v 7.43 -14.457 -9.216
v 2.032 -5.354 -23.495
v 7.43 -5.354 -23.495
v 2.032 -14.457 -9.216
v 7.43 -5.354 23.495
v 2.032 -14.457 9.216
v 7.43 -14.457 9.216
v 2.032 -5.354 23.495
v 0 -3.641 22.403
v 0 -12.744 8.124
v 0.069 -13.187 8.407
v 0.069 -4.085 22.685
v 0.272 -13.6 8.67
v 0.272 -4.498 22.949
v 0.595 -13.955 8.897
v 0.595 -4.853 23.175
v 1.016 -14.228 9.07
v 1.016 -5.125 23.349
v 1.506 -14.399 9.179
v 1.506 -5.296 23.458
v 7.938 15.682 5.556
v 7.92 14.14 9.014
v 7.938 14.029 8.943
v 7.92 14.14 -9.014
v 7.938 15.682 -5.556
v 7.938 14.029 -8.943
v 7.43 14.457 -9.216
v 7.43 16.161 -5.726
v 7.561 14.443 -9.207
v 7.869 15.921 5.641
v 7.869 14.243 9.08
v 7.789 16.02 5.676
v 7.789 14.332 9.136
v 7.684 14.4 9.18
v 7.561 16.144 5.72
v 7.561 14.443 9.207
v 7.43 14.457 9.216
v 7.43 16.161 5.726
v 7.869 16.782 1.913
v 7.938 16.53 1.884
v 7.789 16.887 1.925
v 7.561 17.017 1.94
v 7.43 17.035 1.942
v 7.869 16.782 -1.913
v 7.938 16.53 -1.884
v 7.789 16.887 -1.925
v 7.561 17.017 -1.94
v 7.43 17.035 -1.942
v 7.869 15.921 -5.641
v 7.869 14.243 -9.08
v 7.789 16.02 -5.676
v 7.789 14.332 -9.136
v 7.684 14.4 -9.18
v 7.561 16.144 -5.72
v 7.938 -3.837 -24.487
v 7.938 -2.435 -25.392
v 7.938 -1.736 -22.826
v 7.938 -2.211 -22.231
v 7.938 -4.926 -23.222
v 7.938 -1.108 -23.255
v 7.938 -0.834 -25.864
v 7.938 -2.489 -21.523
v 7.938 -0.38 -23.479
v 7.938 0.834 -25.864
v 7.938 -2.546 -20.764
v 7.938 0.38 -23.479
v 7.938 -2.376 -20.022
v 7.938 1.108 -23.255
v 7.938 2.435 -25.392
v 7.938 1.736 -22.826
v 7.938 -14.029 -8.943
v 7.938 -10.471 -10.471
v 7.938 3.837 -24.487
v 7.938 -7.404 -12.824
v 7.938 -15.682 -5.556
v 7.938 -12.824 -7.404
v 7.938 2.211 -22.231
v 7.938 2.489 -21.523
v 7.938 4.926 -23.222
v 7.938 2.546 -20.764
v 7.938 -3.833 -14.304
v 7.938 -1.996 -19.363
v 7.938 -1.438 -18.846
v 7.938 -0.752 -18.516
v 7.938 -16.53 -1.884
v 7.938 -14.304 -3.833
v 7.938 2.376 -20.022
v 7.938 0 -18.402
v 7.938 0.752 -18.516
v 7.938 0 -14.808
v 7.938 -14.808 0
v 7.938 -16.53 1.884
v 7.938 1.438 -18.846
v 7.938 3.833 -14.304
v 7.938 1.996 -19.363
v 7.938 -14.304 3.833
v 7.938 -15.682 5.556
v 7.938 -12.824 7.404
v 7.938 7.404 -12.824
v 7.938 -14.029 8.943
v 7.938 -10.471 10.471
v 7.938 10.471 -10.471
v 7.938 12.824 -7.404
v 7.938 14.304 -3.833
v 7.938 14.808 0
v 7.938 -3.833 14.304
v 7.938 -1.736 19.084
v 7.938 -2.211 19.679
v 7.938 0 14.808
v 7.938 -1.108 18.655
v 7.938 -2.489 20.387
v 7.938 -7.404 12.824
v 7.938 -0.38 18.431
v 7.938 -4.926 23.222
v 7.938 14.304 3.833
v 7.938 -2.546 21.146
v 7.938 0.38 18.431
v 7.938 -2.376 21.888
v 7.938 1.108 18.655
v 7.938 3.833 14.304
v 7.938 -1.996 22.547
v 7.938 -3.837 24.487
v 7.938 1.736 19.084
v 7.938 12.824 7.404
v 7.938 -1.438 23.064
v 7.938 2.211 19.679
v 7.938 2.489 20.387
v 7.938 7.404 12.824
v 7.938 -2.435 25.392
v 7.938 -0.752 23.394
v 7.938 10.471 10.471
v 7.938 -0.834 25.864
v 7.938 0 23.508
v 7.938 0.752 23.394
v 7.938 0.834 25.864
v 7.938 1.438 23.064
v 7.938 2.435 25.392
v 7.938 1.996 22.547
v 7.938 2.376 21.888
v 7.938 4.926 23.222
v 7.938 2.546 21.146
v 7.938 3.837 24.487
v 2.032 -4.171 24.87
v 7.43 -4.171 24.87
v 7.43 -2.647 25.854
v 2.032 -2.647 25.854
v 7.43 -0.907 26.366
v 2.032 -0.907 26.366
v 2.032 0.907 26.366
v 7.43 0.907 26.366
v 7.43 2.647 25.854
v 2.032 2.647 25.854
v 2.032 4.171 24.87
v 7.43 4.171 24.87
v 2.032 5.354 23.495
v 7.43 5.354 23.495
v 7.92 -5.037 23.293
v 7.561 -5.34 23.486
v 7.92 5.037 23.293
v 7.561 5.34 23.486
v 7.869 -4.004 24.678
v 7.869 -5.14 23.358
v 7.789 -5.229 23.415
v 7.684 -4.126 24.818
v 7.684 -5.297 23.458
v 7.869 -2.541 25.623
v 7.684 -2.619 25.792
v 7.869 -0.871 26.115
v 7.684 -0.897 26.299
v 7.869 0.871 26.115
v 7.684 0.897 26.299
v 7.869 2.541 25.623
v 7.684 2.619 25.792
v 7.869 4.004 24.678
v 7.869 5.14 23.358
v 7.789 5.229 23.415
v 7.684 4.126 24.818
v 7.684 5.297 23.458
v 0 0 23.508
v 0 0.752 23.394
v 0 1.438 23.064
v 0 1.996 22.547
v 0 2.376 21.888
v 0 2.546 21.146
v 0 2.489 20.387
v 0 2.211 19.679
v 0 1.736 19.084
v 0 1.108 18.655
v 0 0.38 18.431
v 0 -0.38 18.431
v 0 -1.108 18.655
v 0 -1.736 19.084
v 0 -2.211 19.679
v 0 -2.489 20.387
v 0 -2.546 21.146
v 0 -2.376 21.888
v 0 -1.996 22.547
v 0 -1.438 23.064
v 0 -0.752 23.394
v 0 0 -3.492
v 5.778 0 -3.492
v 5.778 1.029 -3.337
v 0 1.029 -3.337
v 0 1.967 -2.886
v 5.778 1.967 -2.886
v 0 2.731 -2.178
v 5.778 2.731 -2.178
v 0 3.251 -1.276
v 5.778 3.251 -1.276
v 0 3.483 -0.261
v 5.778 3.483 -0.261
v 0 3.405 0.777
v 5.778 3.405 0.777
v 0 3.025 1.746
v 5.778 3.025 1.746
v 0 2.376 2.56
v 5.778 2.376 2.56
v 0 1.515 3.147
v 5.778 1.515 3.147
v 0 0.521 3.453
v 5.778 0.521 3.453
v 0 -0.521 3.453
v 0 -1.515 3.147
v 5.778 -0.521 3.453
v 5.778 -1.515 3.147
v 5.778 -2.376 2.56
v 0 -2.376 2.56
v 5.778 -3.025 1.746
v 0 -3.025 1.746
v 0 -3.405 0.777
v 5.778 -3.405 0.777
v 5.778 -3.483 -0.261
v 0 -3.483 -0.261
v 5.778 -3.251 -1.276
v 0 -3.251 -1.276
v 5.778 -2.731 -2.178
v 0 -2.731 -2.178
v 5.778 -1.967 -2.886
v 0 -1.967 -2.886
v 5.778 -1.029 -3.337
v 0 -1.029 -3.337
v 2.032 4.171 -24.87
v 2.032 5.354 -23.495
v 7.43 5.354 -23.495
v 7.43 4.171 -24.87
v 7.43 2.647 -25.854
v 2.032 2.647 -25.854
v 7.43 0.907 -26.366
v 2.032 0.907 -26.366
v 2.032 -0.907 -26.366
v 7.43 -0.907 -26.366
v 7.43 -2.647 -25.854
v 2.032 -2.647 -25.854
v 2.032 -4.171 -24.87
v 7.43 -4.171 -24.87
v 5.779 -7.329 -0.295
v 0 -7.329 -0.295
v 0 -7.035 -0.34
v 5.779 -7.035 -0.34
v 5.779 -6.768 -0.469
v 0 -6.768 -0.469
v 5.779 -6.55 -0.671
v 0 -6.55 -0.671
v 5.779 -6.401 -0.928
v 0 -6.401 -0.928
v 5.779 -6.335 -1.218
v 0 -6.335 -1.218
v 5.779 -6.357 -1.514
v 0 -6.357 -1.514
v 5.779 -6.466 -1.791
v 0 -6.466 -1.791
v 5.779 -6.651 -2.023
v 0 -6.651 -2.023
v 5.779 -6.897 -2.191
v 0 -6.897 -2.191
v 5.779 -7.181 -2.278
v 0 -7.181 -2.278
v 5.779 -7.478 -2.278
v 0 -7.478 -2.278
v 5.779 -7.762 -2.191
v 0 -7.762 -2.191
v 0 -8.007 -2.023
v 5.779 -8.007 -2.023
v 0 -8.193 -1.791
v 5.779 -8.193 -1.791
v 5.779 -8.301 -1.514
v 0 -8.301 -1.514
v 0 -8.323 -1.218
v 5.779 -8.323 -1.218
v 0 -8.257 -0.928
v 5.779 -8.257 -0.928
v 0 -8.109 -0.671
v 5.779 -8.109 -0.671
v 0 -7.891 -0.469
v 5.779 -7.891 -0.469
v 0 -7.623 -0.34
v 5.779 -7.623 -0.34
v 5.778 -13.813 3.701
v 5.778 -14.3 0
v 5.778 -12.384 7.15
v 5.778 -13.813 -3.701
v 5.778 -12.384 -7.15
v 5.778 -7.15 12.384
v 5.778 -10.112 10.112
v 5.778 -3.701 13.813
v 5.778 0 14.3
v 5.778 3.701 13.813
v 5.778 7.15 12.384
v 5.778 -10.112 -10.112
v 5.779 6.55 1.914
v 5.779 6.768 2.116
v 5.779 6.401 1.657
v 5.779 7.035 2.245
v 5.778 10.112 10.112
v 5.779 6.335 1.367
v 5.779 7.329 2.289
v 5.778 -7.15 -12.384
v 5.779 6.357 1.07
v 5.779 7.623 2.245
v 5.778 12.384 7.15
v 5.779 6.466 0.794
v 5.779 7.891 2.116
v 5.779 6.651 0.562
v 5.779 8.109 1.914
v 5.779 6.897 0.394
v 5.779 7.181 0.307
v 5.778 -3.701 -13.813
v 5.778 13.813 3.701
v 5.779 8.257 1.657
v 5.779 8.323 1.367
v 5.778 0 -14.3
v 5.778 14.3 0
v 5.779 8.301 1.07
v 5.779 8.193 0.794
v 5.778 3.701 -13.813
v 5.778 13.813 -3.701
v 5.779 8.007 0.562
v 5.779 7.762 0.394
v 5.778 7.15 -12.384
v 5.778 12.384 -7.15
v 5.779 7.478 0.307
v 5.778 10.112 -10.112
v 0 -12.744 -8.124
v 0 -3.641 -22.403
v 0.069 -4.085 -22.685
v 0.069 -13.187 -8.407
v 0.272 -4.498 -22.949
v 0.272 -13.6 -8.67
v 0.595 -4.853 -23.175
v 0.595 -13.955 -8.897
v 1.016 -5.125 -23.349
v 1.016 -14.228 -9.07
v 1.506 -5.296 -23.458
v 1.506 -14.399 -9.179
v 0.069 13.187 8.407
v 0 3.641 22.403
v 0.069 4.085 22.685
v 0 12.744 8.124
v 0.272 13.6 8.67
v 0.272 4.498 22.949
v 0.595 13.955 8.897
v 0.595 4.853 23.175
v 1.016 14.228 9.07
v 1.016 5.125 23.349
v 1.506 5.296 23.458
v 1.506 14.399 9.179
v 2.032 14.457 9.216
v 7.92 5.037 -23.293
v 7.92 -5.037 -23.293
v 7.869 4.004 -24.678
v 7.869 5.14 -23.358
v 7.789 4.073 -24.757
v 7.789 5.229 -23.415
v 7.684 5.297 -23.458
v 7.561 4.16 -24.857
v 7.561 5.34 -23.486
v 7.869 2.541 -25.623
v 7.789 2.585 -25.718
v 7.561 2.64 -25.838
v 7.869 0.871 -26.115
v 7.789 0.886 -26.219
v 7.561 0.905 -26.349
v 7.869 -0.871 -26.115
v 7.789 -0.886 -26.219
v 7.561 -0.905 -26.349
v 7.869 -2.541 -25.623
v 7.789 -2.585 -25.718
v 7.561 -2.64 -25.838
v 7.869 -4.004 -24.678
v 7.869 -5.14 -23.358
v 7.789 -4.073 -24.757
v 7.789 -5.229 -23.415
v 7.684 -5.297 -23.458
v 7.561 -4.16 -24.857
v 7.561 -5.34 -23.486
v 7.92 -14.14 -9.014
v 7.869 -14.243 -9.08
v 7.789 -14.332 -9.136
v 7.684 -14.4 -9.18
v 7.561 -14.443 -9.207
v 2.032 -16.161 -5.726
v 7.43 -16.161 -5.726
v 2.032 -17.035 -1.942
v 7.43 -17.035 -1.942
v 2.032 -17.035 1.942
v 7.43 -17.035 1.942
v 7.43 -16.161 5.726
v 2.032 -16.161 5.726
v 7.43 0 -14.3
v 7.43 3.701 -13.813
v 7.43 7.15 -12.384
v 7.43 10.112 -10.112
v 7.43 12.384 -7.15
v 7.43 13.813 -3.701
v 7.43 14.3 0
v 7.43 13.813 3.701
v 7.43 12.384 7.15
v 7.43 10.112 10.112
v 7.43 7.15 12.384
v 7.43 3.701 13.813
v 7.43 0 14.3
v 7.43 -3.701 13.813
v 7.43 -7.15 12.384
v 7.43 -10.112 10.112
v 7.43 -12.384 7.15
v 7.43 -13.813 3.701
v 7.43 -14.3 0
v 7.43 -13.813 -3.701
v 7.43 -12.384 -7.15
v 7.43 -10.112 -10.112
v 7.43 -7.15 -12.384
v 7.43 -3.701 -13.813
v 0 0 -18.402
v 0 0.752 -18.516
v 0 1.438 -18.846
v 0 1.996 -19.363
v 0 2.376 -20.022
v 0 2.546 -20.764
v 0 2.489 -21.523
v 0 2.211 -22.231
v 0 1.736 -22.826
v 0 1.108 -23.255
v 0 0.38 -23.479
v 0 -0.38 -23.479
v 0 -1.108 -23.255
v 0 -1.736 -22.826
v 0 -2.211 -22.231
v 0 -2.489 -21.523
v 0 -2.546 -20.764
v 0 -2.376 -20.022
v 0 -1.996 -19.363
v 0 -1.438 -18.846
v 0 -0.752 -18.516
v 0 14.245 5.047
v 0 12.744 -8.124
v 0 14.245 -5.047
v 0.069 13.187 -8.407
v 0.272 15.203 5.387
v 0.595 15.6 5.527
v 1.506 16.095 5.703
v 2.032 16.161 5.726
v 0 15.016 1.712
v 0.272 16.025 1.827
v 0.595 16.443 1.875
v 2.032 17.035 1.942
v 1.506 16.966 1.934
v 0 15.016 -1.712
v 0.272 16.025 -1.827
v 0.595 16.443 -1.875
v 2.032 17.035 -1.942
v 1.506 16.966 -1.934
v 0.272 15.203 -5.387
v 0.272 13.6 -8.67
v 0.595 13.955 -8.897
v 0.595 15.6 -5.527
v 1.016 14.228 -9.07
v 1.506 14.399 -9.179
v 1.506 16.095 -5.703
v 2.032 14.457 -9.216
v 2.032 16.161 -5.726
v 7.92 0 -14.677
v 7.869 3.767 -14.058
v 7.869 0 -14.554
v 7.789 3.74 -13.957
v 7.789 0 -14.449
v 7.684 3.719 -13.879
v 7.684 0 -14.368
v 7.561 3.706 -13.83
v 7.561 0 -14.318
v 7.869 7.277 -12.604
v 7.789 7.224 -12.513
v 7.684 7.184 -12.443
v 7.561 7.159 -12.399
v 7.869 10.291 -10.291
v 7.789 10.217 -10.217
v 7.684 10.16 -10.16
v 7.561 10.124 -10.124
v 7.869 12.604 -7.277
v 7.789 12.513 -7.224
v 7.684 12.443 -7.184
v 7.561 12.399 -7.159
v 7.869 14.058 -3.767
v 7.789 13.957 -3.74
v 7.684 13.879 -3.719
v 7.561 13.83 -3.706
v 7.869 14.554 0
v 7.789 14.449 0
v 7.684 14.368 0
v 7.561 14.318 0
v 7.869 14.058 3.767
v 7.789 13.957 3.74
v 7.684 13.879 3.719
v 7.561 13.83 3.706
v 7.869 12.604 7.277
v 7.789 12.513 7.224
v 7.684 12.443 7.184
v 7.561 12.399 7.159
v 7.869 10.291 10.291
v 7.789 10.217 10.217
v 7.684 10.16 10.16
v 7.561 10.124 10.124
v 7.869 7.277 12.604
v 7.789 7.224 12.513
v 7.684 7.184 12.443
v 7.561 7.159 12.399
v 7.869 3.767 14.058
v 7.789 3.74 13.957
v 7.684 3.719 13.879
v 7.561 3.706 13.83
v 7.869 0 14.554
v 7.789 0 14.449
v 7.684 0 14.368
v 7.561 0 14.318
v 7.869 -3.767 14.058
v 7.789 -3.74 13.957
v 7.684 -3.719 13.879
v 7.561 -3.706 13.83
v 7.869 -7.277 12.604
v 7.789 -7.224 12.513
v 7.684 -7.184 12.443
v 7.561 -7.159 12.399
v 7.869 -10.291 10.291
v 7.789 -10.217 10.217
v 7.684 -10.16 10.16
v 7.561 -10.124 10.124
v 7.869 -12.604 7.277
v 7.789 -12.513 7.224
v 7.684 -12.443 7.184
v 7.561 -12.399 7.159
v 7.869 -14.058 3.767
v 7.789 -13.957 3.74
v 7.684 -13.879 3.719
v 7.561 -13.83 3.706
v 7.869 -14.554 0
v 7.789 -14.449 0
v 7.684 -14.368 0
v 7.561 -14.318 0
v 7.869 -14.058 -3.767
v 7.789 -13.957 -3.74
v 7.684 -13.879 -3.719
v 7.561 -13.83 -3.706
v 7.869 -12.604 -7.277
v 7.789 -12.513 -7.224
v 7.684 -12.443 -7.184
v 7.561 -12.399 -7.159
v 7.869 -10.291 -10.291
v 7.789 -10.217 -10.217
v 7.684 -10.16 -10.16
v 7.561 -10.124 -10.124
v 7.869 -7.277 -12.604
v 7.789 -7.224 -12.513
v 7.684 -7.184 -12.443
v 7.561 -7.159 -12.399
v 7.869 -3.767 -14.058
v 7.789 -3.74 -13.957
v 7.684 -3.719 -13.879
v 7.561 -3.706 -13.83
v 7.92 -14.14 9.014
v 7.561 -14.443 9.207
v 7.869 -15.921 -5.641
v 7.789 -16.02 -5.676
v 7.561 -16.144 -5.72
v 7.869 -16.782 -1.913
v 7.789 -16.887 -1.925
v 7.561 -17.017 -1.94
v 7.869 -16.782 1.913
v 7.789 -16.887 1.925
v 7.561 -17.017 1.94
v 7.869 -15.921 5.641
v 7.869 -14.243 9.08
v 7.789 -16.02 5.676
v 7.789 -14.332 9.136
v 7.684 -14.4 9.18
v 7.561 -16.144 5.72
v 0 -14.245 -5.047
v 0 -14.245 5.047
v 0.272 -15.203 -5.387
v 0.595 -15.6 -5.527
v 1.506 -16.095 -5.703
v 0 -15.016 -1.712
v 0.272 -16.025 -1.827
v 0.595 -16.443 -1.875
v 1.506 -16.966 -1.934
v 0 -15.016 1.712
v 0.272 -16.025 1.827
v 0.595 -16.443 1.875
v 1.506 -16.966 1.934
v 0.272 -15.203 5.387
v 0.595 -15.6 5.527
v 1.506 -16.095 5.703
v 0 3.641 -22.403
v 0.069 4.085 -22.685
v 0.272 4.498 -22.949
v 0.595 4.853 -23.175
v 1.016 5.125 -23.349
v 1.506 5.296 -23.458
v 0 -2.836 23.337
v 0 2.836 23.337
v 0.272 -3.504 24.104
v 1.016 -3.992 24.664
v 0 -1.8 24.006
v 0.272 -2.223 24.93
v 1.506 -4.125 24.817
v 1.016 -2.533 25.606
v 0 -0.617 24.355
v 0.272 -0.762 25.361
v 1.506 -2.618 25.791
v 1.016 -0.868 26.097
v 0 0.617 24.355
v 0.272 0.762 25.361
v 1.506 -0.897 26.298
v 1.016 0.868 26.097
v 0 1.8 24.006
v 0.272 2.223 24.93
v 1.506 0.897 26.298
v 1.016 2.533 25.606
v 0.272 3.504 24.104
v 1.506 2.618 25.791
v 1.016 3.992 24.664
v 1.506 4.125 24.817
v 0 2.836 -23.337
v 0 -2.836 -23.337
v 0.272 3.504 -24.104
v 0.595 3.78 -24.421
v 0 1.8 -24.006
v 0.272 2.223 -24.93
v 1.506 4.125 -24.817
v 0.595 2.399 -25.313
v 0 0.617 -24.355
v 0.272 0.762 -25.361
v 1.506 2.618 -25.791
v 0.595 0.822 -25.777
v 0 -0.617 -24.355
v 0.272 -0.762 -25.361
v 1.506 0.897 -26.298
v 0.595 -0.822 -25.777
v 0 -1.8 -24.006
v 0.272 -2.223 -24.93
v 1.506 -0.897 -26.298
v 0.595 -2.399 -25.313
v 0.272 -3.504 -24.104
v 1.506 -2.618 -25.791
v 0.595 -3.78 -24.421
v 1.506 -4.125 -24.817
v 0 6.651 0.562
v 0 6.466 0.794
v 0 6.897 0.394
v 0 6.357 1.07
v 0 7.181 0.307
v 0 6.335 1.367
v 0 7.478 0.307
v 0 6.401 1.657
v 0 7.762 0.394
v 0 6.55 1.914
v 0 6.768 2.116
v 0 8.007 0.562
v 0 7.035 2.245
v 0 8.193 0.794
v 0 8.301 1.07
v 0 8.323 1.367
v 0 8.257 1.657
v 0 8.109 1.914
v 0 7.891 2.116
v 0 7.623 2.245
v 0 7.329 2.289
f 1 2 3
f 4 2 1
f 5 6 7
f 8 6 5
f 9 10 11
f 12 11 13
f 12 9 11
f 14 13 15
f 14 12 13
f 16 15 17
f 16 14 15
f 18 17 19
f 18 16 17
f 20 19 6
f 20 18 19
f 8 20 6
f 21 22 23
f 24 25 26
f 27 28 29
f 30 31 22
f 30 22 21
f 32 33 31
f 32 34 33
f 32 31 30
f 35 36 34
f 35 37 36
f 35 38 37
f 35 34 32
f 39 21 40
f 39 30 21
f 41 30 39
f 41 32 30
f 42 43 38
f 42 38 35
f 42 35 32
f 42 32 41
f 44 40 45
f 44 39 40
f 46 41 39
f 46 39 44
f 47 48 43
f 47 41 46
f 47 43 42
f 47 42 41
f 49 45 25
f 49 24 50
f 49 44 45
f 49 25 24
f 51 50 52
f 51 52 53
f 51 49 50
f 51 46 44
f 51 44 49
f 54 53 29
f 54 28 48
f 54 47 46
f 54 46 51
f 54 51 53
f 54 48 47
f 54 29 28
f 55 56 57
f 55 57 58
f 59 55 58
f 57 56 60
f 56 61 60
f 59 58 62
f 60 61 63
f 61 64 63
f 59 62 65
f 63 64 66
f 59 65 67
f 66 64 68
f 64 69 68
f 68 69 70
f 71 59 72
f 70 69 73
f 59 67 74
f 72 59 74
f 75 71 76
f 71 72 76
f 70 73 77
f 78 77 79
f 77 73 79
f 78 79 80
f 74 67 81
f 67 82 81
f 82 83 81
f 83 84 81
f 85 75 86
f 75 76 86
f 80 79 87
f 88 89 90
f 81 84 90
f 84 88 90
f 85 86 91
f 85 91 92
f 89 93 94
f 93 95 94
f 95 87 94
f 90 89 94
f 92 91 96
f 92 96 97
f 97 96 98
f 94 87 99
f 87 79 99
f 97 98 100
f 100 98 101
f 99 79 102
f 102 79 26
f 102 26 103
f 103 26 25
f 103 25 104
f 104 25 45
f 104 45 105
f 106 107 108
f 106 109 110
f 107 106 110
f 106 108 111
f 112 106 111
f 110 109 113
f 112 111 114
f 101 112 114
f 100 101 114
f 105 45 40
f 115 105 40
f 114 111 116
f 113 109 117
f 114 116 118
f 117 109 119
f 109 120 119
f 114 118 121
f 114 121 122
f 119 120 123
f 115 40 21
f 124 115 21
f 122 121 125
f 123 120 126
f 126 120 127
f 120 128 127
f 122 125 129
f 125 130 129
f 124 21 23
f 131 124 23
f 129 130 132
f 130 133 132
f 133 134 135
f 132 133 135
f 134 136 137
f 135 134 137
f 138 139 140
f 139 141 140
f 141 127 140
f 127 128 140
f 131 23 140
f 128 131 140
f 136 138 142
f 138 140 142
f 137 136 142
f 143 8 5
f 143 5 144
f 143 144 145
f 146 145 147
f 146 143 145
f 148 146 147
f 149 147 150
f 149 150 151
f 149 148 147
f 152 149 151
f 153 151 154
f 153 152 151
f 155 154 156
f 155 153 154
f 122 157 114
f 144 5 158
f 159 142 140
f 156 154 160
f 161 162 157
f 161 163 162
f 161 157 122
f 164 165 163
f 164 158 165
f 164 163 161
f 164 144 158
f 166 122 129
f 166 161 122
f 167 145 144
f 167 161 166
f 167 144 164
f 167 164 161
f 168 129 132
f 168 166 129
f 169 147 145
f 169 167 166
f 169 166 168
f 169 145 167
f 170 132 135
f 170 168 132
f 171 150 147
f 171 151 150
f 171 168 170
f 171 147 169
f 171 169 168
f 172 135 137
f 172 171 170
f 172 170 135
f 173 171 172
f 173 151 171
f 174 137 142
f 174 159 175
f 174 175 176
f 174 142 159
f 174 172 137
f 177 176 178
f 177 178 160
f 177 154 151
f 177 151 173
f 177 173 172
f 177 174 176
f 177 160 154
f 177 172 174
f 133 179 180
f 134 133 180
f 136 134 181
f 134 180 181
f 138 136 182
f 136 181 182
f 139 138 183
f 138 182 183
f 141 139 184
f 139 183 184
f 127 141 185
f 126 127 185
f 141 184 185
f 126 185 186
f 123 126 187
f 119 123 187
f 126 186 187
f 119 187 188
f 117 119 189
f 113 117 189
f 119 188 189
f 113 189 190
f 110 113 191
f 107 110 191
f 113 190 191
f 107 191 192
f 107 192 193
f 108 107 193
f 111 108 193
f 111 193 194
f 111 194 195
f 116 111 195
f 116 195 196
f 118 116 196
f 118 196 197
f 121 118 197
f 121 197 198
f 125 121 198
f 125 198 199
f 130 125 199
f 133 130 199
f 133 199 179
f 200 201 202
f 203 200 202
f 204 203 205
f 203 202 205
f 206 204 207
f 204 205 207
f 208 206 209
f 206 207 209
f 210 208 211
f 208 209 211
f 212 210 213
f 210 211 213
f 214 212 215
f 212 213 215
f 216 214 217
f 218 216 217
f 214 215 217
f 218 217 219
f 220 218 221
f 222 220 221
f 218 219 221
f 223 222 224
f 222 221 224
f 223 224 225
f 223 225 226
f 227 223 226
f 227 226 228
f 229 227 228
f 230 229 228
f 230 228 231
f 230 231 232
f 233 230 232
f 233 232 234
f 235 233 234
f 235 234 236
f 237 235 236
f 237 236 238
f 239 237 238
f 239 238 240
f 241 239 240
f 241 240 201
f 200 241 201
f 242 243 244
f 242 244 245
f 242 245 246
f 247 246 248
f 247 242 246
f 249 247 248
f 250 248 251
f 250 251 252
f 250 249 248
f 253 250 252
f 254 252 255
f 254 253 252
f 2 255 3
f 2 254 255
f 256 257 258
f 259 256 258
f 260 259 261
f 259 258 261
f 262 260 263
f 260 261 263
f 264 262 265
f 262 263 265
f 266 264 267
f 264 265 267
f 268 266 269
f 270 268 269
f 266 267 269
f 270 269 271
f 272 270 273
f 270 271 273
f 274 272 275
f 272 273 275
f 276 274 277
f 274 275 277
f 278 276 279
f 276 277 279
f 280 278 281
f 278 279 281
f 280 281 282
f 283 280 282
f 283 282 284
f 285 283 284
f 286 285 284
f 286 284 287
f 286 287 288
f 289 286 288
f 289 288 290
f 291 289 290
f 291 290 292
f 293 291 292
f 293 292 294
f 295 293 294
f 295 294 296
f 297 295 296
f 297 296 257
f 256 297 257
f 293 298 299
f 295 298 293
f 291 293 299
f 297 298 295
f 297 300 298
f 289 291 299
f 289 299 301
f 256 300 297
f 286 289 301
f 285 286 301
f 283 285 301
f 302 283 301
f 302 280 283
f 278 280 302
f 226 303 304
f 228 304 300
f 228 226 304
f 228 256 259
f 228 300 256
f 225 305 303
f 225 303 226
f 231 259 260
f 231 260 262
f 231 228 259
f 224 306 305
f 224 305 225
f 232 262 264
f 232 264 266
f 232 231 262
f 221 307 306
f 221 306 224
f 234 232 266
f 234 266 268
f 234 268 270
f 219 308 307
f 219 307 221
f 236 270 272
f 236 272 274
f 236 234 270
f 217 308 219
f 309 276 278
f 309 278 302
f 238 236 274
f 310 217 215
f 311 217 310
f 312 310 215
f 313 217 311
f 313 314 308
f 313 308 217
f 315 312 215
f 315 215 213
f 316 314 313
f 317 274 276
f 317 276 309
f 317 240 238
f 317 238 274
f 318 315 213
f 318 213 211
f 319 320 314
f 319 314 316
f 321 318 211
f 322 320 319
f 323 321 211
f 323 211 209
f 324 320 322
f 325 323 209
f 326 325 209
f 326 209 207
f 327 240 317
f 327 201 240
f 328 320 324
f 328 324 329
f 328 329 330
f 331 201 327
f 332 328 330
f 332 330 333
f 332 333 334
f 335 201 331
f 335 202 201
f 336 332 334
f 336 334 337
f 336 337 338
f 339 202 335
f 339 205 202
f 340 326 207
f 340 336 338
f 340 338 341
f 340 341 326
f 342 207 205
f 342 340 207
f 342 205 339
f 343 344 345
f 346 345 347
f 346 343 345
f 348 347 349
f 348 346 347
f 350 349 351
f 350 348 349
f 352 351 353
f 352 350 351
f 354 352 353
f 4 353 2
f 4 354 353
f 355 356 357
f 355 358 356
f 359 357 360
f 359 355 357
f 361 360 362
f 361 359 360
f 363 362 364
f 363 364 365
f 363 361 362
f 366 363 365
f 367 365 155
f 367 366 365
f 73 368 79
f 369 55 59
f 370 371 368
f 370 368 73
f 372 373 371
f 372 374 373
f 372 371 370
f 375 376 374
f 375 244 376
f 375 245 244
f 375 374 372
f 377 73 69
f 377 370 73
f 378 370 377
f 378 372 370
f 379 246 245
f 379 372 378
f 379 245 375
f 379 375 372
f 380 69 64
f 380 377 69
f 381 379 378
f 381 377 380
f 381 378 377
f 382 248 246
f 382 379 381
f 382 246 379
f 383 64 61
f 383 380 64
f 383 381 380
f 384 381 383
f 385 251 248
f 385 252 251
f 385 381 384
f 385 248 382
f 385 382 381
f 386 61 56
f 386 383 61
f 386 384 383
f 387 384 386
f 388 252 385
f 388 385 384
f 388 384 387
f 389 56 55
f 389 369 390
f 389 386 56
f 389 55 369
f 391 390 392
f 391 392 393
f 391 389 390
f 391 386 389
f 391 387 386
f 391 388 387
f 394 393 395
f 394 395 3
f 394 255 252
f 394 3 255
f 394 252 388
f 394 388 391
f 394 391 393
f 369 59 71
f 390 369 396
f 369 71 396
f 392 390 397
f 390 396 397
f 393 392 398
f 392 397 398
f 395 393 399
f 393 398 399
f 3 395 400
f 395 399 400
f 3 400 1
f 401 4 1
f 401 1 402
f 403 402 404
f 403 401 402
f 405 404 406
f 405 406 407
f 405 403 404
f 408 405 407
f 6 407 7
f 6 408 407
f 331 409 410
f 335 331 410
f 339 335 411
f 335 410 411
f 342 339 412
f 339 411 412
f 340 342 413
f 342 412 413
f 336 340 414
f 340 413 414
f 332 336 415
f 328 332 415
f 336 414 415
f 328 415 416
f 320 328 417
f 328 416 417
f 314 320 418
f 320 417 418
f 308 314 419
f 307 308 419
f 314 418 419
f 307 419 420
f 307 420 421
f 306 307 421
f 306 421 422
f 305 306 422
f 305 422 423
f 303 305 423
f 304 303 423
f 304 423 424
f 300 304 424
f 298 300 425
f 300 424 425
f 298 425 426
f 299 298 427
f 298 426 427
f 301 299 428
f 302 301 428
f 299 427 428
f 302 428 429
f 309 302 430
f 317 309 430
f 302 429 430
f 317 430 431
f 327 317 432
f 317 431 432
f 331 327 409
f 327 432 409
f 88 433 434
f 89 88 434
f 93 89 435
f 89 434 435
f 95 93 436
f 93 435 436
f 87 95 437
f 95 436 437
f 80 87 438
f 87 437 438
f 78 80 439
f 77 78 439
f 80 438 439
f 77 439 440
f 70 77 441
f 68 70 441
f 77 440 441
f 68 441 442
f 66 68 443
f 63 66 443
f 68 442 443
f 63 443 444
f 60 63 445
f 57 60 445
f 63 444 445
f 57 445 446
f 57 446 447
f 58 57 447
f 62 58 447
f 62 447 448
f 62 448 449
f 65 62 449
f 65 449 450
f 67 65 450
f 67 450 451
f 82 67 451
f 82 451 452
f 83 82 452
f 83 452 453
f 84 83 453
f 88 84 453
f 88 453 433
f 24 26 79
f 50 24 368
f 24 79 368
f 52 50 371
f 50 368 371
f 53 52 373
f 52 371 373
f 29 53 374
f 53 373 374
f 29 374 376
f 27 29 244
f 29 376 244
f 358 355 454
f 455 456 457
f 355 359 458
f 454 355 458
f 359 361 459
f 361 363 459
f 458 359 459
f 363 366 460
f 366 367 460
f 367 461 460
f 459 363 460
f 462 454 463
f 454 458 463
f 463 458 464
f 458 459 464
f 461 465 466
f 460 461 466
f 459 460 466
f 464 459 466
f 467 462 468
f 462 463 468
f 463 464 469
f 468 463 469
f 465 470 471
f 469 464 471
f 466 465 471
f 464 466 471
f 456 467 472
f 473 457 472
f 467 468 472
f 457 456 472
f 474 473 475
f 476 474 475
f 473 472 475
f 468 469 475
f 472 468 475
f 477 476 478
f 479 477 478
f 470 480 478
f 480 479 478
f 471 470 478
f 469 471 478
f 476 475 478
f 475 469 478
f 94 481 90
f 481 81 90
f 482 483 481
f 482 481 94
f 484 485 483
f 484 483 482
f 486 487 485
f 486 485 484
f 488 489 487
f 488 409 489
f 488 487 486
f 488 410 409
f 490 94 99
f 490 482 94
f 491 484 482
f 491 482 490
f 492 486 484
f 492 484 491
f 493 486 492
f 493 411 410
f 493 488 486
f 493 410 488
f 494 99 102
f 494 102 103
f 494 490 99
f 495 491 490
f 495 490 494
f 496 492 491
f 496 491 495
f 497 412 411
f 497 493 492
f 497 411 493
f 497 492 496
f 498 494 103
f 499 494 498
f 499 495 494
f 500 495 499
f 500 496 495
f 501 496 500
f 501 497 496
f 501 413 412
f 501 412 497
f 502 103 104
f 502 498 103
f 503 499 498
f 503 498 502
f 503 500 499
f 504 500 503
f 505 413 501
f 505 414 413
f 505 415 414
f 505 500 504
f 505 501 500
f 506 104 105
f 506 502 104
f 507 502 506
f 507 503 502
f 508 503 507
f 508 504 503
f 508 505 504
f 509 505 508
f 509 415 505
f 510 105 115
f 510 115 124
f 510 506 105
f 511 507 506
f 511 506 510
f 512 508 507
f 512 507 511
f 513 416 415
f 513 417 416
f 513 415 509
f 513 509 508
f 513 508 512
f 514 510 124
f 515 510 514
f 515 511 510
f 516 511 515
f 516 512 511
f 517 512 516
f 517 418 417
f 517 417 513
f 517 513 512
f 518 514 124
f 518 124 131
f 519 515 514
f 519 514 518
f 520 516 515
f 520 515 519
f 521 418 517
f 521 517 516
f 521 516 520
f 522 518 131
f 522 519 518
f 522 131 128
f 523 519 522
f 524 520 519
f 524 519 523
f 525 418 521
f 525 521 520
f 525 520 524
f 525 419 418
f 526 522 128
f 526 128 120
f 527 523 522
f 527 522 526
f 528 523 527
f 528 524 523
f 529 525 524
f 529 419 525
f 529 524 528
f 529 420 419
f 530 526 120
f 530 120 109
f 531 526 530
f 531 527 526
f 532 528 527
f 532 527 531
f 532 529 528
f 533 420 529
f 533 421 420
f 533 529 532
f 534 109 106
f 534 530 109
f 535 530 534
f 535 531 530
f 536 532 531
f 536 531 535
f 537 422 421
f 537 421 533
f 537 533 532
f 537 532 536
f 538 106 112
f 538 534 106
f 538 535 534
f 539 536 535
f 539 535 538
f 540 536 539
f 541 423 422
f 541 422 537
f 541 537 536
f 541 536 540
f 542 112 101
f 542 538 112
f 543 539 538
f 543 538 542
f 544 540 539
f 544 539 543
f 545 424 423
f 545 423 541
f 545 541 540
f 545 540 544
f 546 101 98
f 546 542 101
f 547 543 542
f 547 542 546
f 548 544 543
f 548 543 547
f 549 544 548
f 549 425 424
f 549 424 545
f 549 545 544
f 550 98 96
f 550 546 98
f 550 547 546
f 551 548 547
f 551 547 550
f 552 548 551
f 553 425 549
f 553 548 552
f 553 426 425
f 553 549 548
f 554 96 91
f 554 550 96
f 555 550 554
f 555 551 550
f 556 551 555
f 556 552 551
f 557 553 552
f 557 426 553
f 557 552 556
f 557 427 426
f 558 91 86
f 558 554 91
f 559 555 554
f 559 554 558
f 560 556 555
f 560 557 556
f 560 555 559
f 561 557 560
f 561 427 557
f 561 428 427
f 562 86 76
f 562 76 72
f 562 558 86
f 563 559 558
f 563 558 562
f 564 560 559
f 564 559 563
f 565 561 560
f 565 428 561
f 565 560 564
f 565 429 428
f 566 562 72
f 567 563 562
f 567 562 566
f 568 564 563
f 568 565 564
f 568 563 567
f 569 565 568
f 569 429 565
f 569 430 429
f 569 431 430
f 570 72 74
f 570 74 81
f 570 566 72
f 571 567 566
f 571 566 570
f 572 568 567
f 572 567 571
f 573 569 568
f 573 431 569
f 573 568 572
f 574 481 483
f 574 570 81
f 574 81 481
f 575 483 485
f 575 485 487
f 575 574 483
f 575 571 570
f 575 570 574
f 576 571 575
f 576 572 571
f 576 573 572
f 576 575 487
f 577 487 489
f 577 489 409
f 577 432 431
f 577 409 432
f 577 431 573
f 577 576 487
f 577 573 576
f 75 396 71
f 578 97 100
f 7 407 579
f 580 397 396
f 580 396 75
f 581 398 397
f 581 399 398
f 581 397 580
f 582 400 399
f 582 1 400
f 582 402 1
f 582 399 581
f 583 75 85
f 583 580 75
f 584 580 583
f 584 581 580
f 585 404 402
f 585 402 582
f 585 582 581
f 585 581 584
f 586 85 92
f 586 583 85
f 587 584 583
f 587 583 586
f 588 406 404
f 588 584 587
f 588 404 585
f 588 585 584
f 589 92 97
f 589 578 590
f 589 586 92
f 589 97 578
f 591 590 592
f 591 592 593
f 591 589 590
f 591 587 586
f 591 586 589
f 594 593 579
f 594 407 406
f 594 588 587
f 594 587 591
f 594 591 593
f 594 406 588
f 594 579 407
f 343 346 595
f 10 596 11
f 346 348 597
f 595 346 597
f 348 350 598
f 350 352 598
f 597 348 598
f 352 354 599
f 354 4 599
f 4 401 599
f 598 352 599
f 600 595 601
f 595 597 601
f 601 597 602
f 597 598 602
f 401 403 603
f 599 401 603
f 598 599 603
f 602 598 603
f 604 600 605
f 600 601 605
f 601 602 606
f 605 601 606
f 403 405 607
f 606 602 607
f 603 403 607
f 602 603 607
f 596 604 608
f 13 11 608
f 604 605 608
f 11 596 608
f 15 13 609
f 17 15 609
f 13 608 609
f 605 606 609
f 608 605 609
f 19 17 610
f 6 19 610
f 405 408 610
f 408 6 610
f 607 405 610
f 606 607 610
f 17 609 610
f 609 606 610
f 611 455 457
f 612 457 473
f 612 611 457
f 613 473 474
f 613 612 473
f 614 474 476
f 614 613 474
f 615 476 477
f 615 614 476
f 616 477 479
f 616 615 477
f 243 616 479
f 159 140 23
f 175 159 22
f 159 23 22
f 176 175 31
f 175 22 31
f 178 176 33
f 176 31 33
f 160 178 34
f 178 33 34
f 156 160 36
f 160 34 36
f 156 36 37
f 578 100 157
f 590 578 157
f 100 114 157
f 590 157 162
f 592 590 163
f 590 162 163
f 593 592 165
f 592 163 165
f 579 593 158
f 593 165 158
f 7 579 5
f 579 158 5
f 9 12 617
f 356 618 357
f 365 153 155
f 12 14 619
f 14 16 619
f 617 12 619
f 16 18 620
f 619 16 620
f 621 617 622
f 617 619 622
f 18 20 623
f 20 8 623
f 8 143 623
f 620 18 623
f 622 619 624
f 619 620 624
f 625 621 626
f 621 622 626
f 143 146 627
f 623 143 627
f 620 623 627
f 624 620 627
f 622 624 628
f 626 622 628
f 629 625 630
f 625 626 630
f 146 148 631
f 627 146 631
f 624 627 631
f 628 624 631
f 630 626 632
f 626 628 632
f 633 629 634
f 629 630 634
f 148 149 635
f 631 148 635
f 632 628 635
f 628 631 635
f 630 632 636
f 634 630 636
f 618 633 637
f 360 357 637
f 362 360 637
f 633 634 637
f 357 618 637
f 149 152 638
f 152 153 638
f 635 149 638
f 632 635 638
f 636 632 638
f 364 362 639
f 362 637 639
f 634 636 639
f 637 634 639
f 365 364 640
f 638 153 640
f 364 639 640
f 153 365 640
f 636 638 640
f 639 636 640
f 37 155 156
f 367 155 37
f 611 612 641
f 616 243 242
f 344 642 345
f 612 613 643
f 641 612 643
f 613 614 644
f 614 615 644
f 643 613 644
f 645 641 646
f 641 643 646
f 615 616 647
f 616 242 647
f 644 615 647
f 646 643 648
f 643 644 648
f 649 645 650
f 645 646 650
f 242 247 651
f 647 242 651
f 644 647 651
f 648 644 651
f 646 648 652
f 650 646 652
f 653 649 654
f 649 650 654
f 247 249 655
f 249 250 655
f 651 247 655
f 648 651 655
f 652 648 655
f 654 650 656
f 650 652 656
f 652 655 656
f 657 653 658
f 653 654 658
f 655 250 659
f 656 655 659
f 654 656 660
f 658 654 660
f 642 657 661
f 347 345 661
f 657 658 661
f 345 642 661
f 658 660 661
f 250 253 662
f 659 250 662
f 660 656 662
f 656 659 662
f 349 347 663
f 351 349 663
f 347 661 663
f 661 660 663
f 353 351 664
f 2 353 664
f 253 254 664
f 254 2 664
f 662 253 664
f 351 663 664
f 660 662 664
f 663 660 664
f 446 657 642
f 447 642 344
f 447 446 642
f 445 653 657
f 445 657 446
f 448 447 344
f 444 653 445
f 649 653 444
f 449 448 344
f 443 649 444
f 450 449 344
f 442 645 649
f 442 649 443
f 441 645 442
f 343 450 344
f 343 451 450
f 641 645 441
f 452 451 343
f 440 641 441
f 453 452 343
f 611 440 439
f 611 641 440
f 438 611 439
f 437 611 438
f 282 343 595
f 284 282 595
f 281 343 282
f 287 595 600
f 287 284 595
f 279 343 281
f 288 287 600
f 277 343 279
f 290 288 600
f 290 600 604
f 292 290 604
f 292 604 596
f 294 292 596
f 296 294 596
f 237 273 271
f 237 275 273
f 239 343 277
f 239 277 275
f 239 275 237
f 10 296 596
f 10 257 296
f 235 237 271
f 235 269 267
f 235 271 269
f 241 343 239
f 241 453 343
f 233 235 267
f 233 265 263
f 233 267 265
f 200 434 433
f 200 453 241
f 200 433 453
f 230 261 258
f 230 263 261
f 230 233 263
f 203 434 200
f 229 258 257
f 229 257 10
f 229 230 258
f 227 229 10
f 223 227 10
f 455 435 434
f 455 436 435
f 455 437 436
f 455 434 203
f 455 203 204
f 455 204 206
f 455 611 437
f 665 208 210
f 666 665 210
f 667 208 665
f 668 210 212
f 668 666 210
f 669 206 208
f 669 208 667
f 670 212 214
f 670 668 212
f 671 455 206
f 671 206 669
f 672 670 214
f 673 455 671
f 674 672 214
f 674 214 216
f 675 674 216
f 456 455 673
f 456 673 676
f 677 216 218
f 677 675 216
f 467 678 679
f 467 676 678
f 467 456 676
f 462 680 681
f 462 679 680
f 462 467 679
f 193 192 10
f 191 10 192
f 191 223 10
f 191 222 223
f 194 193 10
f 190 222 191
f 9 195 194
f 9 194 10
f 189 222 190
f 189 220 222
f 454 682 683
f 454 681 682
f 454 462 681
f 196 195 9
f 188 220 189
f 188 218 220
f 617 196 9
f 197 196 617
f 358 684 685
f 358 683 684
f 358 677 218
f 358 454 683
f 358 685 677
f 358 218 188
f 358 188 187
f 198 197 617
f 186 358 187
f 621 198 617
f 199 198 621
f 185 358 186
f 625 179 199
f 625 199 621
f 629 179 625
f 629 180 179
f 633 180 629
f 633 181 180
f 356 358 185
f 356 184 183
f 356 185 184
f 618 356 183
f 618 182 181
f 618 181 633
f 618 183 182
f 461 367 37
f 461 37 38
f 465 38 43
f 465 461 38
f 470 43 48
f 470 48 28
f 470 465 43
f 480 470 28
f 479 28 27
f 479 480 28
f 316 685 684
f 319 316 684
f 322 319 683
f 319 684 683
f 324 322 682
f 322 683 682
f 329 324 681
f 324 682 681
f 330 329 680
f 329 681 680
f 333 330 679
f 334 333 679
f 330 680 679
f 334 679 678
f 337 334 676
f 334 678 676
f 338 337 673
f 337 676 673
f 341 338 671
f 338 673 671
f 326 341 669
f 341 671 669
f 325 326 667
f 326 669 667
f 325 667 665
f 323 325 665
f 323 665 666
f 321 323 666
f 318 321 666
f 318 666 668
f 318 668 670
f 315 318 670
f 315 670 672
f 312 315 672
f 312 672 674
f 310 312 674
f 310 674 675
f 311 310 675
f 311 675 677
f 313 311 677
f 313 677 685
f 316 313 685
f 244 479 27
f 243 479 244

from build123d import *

# Parameters (mm, degrees)
BOSS_EXTRUDE3_DEPTH       = 7.9375
SKETCH5_R                 = 3.4925
CUT_EXTRUDE4_DEPTH        = 33.489674755
SKETCH6_R                 = 14.3002
CUT_EXTRUDE5_DEPTH        = 2.159
TAP_DRILL_FOR_3_48_TAP2_D = 1.9939
F_10_CLEARANCE_HOLE1_D    = 5.1054
FILLET1_R                 = 2.032
FILLET2_R                 = 0.508


with BuildPart() as part:
    # Sketch1 → Boss-Extrude3 (new body)
    with BuildSketch(Plane(origin=(0, 0, 0), x_dir=(0, 0, -1), z_dir=(1, 0, 0))):
        with BuildLine():
            Line((9.216458059, 14.457106413), (23.495, 5.354483857))
            ThreePointArc((23.495, 5.354483857), (26.431497015, 0), (23.495, -5.354483857))
            Line((23.495, -5.354483857), (9.216458059, -14.457106413))
            ThreePointArc((9.216458059, -14.457106413), (0, -17.145), (-9.216458059, -14.457106413))
            Line((-9.216458059, -14.457106413), (-23.495, -5.354483857))
            ThreePointArc((-23.495, -5.354483857), (-26.431497015, 0), (-23.495, 5.354483857))
            Line((-23.495, 5.354483857), (-9.216458059, 14.457106413))
            ThreePointArc((-9.216458059, 14.457106413), (0, 17.145), (9.216458059, 14.457106413))
        make_face()
    extrude(amount=BOSS_EXTRUDE3_DEPTH)

    # Sketch5 → Cut-Extrude4 (cut, through all)
    with BuildSketch(Plane(origin=(7.9375, 0, 0), x_dir=(0, 0, -1), z_dir=(1, 0, 0))):
        Circle(SKETCH5_R)
    extrude(amount=-CUT_EXTRUDE4_DEPTH, mode=Mode.SUBTRACT)

    # Sketch6 → Cut-Extrude5 (cut)
    with BuildSketch(Plane(origin=(7.9375, 0, 0), x_dir=(0, 0, -1), z_dir=(1, 0, 0))):
        Circle(SKETCH6_R)
    extrude(amount=-CUT_EXTRUDE5_DEPTH, mode=Mode.SUBTRACT)

    # Tap Drill for #3-48 Tap2 (through all)
    with Locations(Plane(origin=(5.7785, 0, 0), x_dir=(0, 0, -1), z_dir=(1, 0, 0))):
        with Locations((-1.292324468, 7.329136259), (1.292324468, -7.329136259)):
            Hole(TAP_DRILL_FOR_3_48_TAP2_D / 2)

    # #10 Clearance Hole1 (through all)
    with Locations(Plane(origin=(7.9375, 0, 0), x_dir=(0, 0, -1), z_dir=(1, 0, 0))):
        with Locations((-20.955, 0), (20.955, 0), (9.900488765, 18.695562828)):
            Hole(F_10_CLEARANCE_HOLE1_D / 2)

    # Fillet1
    fillet1_edges = [part.edges().sort_by_distance(p)[0] for p in [
        (0, 9.905795135, 16.355729029),
        (0, 17.145, 0),
        (0, 9.905795135, -16.355729029),
        (0, 0, -26.431497015),
        (0, -9.905795135, -16.355729029),
        (0, -17.145, 0),
        (0, -9.905795135, 16.355729029),
        (0, 0, 26.431497015),
    ]]
    fillet(fillet1_edges, radius=FILLET1_R)

    # Fillet2
    fillet2_edges = [part.edges().sort_by_distance(p)[0] for p in [
        (7.9375, 0, 26.431497015),
        (7.9375, -9.905795135, 16.355729029),
        (7.9375, -17.145, 0),
        (7.9375, -9.905795135, -16.355729029),
        (7.9375, 0, -26.431497015),
        (7.9375, 9.905795135, -16.355729029),
        (7.9375, 0, 14.3002),
        (7.9375, 17.145, 0),
        (7.9375, 9.905795135, 16.355729029),
    ]]
    fillet(fillet2_edges, radius=FILLET2_R)


solid = part.part
